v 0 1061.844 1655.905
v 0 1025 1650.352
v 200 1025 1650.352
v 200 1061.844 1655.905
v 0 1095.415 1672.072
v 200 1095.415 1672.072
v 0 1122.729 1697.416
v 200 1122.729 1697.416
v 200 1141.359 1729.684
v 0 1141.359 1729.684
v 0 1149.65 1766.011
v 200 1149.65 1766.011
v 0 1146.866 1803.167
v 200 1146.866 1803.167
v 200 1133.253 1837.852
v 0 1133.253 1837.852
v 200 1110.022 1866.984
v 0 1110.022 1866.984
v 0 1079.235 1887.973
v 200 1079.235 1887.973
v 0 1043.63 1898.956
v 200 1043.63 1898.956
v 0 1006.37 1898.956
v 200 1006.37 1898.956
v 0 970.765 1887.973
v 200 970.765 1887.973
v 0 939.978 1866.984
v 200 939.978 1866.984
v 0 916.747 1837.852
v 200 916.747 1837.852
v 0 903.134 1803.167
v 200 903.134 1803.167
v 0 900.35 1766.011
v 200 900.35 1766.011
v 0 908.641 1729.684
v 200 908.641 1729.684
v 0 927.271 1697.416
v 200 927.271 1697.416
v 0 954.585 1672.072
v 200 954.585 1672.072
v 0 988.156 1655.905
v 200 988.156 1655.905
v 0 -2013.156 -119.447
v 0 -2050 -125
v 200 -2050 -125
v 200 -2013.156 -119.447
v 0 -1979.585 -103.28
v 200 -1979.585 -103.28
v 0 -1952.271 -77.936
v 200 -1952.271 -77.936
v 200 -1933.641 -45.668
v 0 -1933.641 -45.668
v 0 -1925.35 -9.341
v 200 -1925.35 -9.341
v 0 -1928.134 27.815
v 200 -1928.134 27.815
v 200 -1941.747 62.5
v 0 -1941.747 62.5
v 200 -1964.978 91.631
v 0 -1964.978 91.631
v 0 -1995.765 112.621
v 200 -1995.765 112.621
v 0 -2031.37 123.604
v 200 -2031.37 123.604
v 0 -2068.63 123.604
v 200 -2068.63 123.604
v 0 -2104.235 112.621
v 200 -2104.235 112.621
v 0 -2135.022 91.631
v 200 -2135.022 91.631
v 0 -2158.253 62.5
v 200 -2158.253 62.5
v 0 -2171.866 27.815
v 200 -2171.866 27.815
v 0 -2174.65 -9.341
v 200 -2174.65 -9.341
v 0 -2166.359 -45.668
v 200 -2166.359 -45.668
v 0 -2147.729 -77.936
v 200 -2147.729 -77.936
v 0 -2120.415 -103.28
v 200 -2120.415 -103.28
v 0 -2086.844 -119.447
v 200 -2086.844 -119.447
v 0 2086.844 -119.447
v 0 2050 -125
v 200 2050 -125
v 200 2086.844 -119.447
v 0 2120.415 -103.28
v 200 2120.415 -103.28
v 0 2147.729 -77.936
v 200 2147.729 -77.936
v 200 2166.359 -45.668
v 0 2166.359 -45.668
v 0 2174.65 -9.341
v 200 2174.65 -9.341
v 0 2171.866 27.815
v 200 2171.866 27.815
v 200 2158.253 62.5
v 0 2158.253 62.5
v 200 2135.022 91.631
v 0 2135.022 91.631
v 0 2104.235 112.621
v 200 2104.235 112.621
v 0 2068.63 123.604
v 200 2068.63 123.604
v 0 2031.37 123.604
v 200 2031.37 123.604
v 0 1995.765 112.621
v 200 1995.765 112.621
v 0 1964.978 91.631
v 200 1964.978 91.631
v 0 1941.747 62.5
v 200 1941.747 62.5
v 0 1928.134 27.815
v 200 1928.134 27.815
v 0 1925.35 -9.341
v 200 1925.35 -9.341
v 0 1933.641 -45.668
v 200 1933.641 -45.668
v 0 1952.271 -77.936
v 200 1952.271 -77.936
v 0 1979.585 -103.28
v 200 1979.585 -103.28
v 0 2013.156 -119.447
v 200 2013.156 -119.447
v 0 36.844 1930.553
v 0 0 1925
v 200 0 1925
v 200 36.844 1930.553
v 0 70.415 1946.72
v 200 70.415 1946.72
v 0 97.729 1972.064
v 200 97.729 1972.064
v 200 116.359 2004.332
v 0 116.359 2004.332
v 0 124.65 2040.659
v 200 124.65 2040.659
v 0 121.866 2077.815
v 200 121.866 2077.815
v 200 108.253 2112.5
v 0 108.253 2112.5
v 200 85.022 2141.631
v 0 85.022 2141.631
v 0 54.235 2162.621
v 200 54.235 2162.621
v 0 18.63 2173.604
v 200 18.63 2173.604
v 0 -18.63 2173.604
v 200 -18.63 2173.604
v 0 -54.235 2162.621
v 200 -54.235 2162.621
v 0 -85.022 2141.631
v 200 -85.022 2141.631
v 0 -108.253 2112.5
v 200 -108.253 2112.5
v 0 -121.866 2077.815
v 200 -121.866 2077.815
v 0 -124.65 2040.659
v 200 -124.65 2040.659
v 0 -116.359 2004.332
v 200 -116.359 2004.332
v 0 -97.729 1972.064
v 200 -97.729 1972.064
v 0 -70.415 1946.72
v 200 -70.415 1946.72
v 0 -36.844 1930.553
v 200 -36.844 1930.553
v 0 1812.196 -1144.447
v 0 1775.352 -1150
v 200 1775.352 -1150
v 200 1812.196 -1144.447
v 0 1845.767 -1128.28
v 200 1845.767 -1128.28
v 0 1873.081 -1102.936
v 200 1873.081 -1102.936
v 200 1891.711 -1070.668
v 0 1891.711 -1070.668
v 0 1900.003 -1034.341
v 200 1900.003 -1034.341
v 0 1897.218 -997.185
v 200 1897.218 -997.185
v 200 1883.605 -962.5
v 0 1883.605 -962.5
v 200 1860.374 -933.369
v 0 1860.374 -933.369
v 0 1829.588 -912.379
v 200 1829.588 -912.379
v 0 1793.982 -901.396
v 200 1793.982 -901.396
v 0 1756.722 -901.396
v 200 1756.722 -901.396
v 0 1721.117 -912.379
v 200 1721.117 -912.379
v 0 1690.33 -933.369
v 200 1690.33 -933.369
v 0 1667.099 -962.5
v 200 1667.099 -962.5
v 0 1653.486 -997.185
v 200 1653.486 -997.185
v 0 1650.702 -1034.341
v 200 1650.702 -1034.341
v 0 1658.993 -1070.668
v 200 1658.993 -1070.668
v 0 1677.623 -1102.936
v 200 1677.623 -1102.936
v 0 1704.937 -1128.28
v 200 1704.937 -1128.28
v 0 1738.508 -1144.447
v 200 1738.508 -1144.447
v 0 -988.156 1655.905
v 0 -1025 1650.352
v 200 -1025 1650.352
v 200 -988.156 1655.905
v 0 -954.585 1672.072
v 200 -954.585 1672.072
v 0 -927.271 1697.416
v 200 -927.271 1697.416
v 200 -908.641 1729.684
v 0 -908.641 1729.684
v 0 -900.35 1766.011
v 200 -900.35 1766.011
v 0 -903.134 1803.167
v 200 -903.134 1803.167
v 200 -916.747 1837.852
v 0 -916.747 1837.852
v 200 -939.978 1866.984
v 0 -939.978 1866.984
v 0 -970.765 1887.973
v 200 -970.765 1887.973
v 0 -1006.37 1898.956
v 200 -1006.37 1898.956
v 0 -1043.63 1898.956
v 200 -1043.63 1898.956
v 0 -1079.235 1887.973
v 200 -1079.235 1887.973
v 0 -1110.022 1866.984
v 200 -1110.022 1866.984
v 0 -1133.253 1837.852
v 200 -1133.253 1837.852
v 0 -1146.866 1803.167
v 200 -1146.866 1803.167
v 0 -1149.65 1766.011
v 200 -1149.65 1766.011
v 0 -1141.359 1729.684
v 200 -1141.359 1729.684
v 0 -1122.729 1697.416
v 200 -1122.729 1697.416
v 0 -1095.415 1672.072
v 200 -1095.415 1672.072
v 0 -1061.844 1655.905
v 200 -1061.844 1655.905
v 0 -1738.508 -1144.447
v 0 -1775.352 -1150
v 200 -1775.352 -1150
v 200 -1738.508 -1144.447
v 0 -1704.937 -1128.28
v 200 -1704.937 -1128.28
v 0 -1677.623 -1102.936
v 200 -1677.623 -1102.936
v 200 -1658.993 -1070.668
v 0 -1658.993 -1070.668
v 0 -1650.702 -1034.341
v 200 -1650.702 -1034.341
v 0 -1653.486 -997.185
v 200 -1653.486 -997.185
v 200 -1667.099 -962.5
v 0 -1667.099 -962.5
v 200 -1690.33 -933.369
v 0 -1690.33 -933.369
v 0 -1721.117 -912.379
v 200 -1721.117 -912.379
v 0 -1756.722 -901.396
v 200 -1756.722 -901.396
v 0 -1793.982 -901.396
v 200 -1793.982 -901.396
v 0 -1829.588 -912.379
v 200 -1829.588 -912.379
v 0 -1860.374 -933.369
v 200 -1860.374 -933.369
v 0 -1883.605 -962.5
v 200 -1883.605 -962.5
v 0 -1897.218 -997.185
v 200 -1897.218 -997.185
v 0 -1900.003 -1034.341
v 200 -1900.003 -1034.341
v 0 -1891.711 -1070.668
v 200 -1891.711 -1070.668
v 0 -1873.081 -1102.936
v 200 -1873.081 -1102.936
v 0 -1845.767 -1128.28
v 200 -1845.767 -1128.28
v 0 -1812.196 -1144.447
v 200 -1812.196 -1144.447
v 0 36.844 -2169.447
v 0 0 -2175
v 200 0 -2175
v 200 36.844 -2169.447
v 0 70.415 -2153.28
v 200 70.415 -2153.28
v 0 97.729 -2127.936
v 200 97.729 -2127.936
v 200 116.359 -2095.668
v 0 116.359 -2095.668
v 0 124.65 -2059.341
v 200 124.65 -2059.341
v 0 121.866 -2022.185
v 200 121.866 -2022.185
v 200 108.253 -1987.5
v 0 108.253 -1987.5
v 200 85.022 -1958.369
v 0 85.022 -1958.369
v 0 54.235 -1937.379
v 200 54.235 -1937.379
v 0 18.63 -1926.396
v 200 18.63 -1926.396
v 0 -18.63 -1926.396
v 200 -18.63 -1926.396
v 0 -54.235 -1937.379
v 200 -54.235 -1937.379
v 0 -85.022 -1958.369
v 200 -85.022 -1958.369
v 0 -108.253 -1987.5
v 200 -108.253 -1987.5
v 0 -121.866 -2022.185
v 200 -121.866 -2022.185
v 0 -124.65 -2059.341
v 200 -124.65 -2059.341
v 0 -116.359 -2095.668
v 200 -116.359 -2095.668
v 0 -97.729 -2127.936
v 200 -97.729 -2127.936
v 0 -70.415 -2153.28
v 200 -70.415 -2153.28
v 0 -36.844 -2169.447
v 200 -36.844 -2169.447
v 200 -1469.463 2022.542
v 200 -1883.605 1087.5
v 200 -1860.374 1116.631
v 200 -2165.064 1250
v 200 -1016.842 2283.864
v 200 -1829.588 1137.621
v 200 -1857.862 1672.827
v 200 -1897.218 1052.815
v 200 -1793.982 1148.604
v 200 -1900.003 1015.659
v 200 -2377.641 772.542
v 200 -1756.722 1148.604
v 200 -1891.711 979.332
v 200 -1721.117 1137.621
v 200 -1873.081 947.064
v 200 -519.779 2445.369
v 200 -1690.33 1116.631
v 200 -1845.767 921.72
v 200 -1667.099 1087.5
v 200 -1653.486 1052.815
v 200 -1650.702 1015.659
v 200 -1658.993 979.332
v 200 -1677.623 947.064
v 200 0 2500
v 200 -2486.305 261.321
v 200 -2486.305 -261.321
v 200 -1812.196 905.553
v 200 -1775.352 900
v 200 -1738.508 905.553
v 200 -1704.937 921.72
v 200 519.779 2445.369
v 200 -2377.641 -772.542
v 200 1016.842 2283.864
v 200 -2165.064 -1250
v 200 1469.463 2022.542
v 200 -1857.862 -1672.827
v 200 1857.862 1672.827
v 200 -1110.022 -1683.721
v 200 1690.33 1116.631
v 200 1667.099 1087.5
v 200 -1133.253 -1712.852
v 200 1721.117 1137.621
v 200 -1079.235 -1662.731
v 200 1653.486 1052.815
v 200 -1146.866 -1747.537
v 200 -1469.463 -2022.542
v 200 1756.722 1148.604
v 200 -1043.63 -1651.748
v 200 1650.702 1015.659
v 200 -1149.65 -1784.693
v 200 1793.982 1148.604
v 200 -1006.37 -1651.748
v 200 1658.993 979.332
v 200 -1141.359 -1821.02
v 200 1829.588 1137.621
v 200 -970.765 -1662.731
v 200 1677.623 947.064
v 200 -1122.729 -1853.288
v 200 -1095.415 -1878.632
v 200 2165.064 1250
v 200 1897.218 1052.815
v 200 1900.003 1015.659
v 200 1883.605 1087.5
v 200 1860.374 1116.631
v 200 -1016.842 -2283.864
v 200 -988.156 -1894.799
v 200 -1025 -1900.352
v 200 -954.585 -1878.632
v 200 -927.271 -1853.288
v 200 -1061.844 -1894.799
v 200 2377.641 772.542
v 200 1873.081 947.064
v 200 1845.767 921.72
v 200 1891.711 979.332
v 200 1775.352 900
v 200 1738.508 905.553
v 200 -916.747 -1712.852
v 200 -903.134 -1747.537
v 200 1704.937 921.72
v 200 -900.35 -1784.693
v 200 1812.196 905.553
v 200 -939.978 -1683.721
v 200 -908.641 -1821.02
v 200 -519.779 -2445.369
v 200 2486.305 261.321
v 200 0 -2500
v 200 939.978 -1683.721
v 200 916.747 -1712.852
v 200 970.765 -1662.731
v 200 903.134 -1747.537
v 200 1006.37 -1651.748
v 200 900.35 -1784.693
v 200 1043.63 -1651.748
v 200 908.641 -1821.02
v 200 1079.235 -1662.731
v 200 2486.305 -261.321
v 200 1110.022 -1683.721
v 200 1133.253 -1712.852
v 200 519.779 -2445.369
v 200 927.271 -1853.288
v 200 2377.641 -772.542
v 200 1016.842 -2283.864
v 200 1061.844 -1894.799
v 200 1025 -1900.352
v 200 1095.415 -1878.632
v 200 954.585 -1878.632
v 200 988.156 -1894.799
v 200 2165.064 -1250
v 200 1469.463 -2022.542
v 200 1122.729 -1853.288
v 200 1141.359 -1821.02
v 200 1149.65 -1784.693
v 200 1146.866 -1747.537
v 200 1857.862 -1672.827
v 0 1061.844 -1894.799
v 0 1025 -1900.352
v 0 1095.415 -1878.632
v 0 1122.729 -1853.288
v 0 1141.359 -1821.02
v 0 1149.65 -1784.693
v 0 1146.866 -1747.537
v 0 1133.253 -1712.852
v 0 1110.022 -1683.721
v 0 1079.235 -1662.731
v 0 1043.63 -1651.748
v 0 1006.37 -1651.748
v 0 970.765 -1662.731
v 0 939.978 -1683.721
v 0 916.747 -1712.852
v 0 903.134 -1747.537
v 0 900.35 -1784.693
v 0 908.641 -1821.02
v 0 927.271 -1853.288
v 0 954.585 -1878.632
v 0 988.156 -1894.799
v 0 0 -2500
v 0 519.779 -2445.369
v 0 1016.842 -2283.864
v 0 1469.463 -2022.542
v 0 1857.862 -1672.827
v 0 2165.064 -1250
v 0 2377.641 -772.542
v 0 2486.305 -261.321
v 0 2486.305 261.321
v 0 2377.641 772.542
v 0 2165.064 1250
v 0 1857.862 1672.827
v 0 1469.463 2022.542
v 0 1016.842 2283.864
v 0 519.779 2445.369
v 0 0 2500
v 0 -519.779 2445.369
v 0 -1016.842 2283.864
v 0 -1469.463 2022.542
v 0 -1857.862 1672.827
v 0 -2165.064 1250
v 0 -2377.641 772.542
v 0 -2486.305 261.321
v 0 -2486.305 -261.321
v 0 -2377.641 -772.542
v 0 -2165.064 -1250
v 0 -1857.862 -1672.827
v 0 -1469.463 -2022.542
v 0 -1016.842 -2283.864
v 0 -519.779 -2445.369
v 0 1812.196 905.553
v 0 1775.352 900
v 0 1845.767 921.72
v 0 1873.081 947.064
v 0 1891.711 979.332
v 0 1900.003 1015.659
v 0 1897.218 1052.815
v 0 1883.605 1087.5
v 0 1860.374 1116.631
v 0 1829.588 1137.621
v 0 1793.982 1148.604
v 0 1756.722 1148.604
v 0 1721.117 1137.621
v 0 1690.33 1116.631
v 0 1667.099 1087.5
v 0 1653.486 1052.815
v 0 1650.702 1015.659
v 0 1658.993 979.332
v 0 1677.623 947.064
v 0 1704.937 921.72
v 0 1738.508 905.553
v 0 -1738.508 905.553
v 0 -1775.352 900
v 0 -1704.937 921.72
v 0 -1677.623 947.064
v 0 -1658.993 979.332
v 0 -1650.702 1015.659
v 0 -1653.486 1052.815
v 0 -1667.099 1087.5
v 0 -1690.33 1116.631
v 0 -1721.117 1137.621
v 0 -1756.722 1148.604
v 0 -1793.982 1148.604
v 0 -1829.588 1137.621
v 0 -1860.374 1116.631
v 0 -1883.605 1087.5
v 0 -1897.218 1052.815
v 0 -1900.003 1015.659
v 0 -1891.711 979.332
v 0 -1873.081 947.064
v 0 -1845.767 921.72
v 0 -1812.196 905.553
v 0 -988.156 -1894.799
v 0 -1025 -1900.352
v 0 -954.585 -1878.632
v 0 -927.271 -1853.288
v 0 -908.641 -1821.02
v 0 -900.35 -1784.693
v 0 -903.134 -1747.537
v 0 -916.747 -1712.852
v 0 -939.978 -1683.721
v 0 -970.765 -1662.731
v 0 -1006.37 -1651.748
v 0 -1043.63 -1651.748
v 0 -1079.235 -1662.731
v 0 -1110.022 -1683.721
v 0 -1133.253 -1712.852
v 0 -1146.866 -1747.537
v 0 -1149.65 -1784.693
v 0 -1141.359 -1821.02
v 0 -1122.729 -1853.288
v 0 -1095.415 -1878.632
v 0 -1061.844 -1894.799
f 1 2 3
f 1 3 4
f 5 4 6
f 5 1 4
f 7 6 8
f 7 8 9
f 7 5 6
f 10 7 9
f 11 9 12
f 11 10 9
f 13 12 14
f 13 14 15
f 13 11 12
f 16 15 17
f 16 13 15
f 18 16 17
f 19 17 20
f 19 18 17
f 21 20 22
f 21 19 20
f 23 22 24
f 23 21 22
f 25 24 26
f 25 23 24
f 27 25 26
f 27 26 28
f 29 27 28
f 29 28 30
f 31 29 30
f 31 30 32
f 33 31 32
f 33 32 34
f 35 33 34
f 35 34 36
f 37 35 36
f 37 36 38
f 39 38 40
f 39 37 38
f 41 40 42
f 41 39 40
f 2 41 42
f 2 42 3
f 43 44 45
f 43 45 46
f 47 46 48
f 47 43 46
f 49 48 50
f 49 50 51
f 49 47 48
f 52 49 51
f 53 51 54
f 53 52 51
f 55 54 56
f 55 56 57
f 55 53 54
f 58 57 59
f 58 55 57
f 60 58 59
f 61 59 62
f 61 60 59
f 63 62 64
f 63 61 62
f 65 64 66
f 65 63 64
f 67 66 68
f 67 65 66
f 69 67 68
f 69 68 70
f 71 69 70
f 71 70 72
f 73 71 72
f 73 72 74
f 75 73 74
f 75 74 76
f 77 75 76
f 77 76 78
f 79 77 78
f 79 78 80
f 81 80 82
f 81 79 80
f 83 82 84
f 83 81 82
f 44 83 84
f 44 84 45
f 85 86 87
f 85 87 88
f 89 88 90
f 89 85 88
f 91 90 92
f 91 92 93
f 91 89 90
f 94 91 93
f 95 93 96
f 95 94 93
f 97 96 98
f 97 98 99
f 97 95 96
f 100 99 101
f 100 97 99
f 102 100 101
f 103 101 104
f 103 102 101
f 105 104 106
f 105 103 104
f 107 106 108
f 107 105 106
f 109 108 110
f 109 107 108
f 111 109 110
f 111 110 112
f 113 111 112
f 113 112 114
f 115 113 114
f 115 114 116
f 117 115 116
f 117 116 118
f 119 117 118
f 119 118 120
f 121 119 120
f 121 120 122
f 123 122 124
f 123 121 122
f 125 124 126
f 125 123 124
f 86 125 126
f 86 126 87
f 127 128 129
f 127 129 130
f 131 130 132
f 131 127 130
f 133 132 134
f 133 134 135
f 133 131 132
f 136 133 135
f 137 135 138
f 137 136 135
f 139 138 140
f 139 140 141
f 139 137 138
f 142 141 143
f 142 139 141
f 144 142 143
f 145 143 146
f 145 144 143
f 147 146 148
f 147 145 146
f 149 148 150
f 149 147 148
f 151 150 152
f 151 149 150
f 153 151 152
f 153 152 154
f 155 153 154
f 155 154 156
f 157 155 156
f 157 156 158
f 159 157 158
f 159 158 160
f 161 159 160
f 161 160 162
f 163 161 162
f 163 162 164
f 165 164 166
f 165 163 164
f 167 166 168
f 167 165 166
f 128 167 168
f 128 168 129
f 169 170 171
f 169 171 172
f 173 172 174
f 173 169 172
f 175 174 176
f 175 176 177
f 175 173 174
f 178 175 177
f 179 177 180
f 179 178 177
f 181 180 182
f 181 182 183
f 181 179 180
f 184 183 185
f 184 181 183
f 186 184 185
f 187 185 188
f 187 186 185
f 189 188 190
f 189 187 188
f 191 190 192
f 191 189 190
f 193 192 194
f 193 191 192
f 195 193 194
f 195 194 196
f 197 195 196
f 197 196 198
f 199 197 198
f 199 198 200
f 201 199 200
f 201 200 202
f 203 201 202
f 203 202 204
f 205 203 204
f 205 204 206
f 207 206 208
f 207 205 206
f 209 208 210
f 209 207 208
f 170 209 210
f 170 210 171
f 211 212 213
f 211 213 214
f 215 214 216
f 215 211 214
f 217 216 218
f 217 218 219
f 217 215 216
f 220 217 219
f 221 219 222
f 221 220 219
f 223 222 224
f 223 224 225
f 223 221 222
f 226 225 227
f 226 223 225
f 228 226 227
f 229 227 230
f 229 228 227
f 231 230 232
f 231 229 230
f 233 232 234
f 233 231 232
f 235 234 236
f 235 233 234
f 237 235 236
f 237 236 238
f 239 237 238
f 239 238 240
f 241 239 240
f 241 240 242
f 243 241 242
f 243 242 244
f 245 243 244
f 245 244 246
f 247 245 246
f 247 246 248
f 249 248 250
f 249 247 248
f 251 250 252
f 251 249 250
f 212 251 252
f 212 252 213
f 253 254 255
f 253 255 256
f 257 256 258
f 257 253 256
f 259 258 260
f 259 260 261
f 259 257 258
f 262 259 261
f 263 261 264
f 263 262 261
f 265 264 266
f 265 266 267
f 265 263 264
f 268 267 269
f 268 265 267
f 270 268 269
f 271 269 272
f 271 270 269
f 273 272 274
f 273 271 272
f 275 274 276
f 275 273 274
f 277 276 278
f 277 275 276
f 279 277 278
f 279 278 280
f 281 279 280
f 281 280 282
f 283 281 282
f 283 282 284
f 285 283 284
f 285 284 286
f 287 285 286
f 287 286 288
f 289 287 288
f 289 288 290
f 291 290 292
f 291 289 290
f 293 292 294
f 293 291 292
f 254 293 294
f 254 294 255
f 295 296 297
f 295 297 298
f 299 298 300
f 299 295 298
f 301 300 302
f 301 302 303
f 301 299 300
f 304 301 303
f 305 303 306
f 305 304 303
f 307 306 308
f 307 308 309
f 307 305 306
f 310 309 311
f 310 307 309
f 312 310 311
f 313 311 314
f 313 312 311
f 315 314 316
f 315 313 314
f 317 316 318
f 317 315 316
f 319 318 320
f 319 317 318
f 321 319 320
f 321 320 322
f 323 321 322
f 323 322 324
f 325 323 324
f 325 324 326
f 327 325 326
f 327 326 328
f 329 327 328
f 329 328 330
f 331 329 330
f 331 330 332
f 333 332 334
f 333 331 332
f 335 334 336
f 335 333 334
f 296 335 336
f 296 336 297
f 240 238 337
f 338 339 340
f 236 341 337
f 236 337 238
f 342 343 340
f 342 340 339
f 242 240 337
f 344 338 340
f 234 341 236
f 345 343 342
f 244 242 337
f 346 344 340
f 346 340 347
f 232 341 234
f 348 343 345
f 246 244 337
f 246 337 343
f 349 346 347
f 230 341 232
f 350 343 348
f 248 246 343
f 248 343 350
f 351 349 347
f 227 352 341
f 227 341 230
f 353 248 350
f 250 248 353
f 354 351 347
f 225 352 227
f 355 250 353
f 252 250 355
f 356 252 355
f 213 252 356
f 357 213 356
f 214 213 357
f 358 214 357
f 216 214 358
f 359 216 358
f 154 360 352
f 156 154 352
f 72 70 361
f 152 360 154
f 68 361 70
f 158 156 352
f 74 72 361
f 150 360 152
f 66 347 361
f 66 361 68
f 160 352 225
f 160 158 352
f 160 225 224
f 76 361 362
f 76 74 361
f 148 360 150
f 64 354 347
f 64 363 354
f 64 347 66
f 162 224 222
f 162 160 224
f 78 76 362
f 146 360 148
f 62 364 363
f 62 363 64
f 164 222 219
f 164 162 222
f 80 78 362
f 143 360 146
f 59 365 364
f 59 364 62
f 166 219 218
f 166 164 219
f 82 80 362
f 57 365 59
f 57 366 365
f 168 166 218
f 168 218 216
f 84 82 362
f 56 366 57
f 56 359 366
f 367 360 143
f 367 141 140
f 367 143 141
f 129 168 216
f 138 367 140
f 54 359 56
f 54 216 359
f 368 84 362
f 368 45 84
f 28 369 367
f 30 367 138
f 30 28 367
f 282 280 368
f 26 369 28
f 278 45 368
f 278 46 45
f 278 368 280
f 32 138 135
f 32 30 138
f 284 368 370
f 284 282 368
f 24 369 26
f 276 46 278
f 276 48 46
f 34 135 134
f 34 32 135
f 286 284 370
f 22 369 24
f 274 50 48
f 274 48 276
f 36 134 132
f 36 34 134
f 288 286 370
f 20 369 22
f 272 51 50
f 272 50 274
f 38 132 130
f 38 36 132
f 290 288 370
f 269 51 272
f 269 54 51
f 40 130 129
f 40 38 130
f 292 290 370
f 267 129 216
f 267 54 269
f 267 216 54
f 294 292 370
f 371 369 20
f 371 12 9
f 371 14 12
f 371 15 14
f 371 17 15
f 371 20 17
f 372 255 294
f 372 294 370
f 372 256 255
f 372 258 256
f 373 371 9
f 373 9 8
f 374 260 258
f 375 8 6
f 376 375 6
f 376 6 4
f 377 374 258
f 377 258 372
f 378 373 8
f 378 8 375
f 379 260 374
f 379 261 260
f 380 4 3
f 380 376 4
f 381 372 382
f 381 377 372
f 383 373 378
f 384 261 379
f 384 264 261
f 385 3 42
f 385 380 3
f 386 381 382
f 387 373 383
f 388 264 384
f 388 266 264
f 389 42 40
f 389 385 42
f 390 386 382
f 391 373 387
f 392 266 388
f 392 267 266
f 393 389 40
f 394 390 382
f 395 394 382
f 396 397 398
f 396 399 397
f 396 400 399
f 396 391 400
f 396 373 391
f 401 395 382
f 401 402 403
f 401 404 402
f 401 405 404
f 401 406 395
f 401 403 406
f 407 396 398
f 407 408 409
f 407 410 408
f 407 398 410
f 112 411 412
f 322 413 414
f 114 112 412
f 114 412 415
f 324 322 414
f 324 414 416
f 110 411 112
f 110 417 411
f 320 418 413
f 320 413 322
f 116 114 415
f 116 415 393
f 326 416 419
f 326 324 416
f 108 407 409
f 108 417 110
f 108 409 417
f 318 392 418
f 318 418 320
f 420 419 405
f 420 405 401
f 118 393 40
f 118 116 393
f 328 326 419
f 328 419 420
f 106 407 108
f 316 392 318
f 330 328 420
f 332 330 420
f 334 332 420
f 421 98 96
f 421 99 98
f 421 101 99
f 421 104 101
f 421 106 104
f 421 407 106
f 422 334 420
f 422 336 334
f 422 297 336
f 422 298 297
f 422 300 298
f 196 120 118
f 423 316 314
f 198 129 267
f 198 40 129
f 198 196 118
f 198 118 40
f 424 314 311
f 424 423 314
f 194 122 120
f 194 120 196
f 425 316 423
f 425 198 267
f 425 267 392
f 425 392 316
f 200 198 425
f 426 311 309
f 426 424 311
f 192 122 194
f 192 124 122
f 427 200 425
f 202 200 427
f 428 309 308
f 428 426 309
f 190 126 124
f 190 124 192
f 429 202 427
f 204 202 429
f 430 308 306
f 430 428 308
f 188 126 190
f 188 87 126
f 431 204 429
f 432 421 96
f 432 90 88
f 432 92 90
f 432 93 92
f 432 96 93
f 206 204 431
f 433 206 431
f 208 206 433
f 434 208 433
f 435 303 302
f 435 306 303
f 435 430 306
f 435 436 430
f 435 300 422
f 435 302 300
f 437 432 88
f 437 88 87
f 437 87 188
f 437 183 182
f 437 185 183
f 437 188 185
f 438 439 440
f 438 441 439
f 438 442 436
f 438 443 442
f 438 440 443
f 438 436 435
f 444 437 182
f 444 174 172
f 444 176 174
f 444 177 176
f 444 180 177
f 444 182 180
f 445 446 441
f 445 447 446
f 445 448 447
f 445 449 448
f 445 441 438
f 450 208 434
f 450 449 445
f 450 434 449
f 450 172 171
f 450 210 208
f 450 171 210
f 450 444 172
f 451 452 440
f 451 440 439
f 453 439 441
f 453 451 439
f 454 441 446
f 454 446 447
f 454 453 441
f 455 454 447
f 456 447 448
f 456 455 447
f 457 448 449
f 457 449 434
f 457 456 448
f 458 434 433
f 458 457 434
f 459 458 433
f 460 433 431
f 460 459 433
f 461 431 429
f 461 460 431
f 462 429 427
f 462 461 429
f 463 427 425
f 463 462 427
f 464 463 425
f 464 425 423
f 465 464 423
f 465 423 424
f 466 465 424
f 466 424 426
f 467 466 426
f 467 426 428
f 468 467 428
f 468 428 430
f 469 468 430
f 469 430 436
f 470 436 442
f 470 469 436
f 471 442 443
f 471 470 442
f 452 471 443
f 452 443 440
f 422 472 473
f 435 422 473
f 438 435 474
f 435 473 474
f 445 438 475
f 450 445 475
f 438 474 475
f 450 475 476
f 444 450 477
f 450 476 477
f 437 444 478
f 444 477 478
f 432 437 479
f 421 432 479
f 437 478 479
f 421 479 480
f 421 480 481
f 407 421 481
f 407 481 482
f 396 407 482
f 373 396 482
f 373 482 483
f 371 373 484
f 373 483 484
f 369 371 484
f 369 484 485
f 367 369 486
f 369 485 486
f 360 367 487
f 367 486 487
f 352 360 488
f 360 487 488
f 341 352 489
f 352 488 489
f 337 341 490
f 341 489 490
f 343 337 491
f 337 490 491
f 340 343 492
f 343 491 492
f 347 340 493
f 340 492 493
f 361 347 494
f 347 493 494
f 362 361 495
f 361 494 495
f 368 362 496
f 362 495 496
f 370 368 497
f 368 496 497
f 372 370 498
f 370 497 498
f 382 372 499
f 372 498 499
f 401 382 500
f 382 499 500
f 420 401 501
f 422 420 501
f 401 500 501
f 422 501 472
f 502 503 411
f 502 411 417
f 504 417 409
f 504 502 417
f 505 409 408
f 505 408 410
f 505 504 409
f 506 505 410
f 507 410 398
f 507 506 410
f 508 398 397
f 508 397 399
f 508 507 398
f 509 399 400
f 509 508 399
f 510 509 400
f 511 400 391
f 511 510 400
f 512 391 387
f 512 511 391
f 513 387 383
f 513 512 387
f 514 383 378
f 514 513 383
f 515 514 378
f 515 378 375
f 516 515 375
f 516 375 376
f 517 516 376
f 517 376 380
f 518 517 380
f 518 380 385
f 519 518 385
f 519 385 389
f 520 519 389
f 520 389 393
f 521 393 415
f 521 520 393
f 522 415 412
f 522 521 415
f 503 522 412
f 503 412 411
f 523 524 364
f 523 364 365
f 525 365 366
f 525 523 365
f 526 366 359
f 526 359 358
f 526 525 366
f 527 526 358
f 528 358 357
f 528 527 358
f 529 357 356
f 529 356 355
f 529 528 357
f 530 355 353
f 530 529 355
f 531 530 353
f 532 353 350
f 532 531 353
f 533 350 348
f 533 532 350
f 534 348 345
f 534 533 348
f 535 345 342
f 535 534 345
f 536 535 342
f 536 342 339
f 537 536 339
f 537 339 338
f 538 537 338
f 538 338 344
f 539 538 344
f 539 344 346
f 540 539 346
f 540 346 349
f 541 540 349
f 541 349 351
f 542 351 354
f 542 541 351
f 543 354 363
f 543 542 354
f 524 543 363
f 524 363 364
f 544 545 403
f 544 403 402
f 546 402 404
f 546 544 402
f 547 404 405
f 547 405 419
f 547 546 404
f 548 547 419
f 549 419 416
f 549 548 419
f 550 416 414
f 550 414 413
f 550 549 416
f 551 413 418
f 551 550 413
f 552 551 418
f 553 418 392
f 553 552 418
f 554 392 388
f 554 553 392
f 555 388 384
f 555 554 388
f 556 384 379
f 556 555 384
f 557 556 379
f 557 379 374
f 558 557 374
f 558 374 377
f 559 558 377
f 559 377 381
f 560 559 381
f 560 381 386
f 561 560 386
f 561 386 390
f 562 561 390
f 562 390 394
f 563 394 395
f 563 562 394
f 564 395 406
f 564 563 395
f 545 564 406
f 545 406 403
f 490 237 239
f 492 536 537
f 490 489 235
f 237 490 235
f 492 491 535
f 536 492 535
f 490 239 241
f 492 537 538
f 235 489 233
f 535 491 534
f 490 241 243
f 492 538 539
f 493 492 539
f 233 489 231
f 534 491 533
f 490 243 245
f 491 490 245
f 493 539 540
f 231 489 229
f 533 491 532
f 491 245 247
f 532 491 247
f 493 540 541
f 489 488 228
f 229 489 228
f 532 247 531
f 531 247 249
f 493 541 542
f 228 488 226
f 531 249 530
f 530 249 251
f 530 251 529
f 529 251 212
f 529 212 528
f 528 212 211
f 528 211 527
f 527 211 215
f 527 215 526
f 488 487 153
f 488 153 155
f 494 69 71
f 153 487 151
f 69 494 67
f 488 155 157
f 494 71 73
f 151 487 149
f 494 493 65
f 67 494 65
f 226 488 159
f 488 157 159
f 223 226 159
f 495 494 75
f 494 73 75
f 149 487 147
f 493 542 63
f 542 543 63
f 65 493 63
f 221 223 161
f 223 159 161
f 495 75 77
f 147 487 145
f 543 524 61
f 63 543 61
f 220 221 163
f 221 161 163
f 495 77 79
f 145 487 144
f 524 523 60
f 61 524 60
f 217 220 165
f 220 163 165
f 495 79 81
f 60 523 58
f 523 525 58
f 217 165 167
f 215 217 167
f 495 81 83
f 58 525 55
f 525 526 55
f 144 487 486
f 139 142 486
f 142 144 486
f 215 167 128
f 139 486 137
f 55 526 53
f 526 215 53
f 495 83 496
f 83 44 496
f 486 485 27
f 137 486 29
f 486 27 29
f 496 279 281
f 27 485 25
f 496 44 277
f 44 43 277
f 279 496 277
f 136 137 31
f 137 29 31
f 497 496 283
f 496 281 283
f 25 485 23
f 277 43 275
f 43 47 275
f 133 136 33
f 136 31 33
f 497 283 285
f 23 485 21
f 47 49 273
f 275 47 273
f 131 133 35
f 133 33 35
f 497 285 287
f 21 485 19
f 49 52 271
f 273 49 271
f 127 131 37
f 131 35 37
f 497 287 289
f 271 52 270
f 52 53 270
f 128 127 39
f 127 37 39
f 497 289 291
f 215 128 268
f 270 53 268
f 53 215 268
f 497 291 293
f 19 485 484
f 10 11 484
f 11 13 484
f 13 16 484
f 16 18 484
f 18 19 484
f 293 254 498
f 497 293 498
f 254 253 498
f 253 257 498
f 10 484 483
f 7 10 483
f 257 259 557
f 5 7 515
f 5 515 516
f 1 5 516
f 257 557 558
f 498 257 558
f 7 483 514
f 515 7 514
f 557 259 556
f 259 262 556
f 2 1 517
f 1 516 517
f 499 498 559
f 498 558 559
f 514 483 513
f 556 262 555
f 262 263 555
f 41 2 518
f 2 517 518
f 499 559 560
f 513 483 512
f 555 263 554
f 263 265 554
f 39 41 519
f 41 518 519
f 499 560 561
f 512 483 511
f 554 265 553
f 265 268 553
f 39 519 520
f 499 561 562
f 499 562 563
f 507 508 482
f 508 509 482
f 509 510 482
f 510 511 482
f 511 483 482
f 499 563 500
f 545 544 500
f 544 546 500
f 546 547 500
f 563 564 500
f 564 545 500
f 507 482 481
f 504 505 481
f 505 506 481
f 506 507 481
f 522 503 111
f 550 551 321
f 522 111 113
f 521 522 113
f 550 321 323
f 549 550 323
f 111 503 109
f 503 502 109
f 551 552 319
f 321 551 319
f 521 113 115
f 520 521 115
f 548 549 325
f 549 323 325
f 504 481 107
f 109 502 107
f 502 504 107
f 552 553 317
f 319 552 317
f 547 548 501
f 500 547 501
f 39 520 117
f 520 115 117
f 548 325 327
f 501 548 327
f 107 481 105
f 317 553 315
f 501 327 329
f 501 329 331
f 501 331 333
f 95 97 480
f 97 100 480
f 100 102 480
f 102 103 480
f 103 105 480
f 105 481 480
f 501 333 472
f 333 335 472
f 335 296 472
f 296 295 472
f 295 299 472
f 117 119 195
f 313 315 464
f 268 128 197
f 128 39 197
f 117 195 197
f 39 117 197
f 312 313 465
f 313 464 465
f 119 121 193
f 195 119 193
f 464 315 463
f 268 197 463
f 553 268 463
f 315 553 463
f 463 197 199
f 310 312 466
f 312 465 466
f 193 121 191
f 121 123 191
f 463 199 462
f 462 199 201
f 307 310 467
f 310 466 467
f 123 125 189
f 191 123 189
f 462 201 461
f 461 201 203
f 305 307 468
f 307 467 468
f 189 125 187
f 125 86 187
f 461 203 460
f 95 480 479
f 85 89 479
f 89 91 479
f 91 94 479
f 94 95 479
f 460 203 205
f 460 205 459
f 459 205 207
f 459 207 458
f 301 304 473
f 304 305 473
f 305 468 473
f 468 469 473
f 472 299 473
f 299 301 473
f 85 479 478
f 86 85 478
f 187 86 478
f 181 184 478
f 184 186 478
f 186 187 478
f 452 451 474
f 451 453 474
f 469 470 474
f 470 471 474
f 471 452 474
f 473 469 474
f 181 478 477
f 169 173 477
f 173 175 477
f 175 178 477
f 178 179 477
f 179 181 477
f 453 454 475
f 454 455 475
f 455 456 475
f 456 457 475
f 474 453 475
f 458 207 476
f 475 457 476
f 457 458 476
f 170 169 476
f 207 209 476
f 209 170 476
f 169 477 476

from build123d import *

# Parameters (mm, degrees)
SKETCH1_R           = 2500
SKETCH1_R_2         = 125
BOSS_EXTRUDE1_DEPTH = 200


with BuildPart() as part:
    # Sketch1 → Boss-Extrude1 (new body)
    with BuildSketch(Plane(origin=(0, 0, 0), x_dir=(0, 0, -1), z_dir=(1, 0, 0))):
        Circle(SKETCH1_R)
        with Locations((0, 2050)):
            Circle(SKETCH1_R_2, mode=Mode.SUBTRACT)
        with Locations((1025, 1775.352077758)):
            Circle(SKETCH1_R_2, mode=Mode.SUBTRACT)
        with Locations((1775.352077758, 1025)):
            Circle(SKETCH1_R_2, mode=Mode.SUBTRACT)
        with Locations((2050, 0)):
            Circle(SKETCH1_R_2, mode=Mode.SUBTRACT)
        with Locations((1775.352077758, -1025)):
            Circle(SKETCH1_R_2, mode=Mode.SUBTRACT)
        with Locations((1025, -1775.352077758)):
            Circle(SKETCH1_R_2, mode=Mode.SUBTRACT)
        with Locations((0, -2050)):
            Circle(SKETCH1_R_2, mode=Mode.SUBTRACT)
        with Locations((-1025, -1775.352077758)):
            Circle(SKETCH1_R_2, mode=Mode.SUBTRACT)
        with Locations((-1775.352077758, -1025)):
            Circle(SKETCH1_R_2, mode=Mode.SUBTRACT)
        with Locations((-2050, 0)):
            Circle(SKETCH1_R_2, mode=Mode.SUBTRACT)
        with Locations((-1775.352077758, 1025)):
            Circle(SKETCH1_R_2, mode=Mode.SUBTRACT)
        with Locations((-1025, 1775.352077758)):
            Circle(SKETCH1_R_2, mode=Mode.SUBTRACT)
    extrude(amount=BOSS_EXTRUDE1_DEPTH)


solid = part.part
